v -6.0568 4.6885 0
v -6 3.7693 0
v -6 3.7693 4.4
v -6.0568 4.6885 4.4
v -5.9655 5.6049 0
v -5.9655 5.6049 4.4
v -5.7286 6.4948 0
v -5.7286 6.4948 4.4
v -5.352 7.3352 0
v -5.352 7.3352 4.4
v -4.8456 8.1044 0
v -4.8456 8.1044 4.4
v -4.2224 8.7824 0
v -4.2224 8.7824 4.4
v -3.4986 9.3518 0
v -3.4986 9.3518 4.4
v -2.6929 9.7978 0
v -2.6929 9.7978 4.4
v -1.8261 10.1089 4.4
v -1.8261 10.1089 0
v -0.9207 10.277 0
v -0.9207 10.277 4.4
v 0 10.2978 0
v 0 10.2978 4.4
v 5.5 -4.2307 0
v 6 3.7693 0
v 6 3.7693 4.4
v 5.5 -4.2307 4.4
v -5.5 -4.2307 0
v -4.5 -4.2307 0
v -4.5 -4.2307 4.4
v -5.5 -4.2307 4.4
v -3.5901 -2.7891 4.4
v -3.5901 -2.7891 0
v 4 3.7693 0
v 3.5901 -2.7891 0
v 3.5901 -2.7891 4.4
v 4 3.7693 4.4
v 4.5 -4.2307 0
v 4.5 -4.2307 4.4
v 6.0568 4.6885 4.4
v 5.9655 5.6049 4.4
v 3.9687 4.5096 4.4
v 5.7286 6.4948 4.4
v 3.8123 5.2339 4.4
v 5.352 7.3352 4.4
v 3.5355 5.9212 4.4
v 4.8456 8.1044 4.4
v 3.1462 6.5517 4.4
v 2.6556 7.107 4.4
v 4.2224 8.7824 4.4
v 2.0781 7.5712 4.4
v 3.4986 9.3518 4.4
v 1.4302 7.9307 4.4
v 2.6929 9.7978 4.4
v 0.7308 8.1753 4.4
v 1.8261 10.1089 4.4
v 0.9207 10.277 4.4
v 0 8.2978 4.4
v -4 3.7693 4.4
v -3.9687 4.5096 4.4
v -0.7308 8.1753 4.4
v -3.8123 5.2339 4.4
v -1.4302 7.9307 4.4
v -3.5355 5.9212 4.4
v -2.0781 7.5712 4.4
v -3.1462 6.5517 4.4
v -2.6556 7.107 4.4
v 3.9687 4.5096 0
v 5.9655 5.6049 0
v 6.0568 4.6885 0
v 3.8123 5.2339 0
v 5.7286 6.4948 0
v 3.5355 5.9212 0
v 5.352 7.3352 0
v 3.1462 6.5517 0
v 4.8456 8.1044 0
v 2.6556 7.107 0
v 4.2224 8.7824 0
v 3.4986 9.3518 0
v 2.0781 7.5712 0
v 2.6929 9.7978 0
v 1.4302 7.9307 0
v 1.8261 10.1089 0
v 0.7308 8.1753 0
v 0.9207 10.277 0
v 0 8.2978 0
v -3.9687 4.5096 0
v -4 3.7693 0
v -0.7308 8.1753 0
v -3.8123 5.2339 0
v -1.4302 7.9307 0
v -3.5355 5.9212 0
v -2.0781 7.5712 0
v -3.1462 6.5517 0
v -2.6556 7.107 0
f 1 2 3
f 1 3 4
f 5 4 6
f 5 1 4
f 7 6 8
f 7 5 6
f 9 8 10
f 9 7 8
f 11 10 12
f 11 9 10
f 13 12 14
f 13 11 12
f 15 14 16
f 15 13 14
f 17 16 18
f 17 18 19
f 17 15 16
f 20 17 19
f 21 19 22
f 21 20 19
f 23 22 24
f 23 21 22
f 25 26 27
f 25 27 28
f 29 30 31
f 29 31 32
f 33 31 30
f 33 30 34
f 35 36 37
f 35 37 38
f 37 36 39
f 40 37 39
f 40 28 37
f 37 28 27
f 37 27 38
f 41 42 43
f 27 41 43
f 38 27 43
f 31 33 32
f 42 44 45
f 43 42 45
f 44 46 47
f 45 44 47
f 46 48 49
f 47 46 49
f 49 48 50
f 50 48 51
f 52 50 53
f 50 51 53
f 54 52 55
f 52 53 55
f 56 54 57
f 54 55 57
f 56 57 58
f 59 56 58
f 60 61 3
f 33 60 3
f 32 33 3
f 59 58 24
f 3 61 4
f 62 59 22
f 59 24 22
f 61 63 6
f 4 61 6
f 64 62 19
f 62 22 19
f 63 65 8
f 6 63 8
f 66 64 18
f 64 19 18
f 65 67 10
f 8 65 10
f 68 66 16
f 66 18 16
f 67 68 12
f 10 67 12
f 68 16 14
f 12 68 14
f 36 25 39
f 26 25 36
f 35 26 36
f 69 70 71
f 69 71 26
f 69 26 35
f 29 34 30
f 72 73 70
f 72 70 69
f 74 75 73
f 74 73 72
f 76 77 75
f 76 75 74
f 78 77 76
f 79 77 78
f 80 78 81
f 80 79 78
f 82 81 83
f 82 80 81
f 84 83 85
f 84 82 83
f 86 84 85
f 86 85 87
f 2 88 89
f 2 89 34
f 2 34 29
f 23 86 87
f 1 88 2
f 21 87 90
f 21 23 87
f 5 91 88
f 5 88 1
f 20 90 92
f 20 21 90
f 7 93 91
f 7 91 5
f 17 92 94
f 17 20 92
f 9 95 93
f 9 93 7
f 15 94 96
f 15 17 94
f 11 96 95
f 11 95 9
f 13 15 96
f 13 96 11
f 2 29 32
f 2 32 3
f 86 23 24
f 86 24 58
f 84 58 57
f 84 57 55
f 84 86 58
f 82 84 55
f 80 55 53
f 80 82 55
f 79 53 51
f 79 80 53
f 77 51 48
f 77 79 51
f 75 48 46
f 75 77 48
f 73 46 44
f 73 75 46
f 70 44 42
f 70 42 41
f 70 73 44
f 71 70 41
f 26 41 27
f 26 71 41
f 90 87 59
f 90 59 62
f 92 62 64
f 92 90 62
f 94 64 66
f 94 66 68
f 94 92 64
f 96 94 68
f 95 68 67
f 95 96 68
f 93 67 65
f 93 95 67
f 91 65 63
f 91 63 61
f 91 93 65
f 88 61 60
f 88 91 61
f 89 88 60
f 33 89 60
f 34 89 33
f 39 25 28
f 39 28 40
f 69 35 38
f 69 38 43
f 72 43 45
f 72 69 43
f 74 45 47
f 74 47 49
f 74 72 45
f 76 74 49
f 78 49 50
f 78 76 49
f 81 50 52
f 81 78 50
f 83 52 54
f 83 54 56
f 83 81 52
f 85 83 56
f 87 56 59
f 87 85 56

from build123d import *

# Parameters (mm, degrees)
BOSS_EXTRUDE1_DEPTH     = 4.4
CUT_EXTRUDE2_DEPTH      = 13.739679342
CUT_EXTRUDE2_DEPTH_BACK = 13.739679342


with BuildPart() as part:
    # Sketch1 → Boss-Extrude1 (new body)
    with BuildSketch(Plane.XY):
        with BuildLine():
            Line((-4, 3.769318743), (-3.5, -4.230681257))
            Line((-3.5, -4.230681257), (-5.5, -4.230681257))
            Line((-5.5, -4.230681257), (-6, 3.769318743))
            ThreePointArc((-6, 3.769318743), (-4.547652978, 8.455926386), (0, 10.297788342))
            ThreePointArc((0, 10.297788342), (4.547652978, 8.455926386), (6, 3.769318743))
            Line((6, 3.769318743), (5.5, -4.230681257))
            Line((5.5, -4.230681257), (3.5, -4.230681257))
            Line((3.5, -4.230681257), (4, 3.769318743))
            ThreePointArc((4, 3.769318743), (2.912733302, 6.839771433), (0, 8.297788342))
            ThreePointArc((0, 8.297788342), (-2.912733302, 6.839771433), (-4, 3.769318743))
        make_face()
    extrude(amount=BOSS_EXTRUDE1_DEPTH)

    # Sketch2 → Cut-Extrude2 (cut, two sides: drawn at the far end of the back side and taken through both)
    with BuildSketch(Plane.XY.offset(-CUT_EXTRUDE2_DEPTH_BACK)):
        Polygon((-3.5, -4.230681257), (-4.5, -4.230681257), (-3.590096666, -2.789134598), align=None)
        Polygon((3.5, -4.230681257), (3.590096666, -2.789134598), (4.5, -4.230681257), align=None)
    extrude(amount=CUT_EXTRUDE2_DEPTH + CUT_EXTRUDE2_DEPTH_BACK, mode=Mode.SUBTRACT)


solid = part.part
